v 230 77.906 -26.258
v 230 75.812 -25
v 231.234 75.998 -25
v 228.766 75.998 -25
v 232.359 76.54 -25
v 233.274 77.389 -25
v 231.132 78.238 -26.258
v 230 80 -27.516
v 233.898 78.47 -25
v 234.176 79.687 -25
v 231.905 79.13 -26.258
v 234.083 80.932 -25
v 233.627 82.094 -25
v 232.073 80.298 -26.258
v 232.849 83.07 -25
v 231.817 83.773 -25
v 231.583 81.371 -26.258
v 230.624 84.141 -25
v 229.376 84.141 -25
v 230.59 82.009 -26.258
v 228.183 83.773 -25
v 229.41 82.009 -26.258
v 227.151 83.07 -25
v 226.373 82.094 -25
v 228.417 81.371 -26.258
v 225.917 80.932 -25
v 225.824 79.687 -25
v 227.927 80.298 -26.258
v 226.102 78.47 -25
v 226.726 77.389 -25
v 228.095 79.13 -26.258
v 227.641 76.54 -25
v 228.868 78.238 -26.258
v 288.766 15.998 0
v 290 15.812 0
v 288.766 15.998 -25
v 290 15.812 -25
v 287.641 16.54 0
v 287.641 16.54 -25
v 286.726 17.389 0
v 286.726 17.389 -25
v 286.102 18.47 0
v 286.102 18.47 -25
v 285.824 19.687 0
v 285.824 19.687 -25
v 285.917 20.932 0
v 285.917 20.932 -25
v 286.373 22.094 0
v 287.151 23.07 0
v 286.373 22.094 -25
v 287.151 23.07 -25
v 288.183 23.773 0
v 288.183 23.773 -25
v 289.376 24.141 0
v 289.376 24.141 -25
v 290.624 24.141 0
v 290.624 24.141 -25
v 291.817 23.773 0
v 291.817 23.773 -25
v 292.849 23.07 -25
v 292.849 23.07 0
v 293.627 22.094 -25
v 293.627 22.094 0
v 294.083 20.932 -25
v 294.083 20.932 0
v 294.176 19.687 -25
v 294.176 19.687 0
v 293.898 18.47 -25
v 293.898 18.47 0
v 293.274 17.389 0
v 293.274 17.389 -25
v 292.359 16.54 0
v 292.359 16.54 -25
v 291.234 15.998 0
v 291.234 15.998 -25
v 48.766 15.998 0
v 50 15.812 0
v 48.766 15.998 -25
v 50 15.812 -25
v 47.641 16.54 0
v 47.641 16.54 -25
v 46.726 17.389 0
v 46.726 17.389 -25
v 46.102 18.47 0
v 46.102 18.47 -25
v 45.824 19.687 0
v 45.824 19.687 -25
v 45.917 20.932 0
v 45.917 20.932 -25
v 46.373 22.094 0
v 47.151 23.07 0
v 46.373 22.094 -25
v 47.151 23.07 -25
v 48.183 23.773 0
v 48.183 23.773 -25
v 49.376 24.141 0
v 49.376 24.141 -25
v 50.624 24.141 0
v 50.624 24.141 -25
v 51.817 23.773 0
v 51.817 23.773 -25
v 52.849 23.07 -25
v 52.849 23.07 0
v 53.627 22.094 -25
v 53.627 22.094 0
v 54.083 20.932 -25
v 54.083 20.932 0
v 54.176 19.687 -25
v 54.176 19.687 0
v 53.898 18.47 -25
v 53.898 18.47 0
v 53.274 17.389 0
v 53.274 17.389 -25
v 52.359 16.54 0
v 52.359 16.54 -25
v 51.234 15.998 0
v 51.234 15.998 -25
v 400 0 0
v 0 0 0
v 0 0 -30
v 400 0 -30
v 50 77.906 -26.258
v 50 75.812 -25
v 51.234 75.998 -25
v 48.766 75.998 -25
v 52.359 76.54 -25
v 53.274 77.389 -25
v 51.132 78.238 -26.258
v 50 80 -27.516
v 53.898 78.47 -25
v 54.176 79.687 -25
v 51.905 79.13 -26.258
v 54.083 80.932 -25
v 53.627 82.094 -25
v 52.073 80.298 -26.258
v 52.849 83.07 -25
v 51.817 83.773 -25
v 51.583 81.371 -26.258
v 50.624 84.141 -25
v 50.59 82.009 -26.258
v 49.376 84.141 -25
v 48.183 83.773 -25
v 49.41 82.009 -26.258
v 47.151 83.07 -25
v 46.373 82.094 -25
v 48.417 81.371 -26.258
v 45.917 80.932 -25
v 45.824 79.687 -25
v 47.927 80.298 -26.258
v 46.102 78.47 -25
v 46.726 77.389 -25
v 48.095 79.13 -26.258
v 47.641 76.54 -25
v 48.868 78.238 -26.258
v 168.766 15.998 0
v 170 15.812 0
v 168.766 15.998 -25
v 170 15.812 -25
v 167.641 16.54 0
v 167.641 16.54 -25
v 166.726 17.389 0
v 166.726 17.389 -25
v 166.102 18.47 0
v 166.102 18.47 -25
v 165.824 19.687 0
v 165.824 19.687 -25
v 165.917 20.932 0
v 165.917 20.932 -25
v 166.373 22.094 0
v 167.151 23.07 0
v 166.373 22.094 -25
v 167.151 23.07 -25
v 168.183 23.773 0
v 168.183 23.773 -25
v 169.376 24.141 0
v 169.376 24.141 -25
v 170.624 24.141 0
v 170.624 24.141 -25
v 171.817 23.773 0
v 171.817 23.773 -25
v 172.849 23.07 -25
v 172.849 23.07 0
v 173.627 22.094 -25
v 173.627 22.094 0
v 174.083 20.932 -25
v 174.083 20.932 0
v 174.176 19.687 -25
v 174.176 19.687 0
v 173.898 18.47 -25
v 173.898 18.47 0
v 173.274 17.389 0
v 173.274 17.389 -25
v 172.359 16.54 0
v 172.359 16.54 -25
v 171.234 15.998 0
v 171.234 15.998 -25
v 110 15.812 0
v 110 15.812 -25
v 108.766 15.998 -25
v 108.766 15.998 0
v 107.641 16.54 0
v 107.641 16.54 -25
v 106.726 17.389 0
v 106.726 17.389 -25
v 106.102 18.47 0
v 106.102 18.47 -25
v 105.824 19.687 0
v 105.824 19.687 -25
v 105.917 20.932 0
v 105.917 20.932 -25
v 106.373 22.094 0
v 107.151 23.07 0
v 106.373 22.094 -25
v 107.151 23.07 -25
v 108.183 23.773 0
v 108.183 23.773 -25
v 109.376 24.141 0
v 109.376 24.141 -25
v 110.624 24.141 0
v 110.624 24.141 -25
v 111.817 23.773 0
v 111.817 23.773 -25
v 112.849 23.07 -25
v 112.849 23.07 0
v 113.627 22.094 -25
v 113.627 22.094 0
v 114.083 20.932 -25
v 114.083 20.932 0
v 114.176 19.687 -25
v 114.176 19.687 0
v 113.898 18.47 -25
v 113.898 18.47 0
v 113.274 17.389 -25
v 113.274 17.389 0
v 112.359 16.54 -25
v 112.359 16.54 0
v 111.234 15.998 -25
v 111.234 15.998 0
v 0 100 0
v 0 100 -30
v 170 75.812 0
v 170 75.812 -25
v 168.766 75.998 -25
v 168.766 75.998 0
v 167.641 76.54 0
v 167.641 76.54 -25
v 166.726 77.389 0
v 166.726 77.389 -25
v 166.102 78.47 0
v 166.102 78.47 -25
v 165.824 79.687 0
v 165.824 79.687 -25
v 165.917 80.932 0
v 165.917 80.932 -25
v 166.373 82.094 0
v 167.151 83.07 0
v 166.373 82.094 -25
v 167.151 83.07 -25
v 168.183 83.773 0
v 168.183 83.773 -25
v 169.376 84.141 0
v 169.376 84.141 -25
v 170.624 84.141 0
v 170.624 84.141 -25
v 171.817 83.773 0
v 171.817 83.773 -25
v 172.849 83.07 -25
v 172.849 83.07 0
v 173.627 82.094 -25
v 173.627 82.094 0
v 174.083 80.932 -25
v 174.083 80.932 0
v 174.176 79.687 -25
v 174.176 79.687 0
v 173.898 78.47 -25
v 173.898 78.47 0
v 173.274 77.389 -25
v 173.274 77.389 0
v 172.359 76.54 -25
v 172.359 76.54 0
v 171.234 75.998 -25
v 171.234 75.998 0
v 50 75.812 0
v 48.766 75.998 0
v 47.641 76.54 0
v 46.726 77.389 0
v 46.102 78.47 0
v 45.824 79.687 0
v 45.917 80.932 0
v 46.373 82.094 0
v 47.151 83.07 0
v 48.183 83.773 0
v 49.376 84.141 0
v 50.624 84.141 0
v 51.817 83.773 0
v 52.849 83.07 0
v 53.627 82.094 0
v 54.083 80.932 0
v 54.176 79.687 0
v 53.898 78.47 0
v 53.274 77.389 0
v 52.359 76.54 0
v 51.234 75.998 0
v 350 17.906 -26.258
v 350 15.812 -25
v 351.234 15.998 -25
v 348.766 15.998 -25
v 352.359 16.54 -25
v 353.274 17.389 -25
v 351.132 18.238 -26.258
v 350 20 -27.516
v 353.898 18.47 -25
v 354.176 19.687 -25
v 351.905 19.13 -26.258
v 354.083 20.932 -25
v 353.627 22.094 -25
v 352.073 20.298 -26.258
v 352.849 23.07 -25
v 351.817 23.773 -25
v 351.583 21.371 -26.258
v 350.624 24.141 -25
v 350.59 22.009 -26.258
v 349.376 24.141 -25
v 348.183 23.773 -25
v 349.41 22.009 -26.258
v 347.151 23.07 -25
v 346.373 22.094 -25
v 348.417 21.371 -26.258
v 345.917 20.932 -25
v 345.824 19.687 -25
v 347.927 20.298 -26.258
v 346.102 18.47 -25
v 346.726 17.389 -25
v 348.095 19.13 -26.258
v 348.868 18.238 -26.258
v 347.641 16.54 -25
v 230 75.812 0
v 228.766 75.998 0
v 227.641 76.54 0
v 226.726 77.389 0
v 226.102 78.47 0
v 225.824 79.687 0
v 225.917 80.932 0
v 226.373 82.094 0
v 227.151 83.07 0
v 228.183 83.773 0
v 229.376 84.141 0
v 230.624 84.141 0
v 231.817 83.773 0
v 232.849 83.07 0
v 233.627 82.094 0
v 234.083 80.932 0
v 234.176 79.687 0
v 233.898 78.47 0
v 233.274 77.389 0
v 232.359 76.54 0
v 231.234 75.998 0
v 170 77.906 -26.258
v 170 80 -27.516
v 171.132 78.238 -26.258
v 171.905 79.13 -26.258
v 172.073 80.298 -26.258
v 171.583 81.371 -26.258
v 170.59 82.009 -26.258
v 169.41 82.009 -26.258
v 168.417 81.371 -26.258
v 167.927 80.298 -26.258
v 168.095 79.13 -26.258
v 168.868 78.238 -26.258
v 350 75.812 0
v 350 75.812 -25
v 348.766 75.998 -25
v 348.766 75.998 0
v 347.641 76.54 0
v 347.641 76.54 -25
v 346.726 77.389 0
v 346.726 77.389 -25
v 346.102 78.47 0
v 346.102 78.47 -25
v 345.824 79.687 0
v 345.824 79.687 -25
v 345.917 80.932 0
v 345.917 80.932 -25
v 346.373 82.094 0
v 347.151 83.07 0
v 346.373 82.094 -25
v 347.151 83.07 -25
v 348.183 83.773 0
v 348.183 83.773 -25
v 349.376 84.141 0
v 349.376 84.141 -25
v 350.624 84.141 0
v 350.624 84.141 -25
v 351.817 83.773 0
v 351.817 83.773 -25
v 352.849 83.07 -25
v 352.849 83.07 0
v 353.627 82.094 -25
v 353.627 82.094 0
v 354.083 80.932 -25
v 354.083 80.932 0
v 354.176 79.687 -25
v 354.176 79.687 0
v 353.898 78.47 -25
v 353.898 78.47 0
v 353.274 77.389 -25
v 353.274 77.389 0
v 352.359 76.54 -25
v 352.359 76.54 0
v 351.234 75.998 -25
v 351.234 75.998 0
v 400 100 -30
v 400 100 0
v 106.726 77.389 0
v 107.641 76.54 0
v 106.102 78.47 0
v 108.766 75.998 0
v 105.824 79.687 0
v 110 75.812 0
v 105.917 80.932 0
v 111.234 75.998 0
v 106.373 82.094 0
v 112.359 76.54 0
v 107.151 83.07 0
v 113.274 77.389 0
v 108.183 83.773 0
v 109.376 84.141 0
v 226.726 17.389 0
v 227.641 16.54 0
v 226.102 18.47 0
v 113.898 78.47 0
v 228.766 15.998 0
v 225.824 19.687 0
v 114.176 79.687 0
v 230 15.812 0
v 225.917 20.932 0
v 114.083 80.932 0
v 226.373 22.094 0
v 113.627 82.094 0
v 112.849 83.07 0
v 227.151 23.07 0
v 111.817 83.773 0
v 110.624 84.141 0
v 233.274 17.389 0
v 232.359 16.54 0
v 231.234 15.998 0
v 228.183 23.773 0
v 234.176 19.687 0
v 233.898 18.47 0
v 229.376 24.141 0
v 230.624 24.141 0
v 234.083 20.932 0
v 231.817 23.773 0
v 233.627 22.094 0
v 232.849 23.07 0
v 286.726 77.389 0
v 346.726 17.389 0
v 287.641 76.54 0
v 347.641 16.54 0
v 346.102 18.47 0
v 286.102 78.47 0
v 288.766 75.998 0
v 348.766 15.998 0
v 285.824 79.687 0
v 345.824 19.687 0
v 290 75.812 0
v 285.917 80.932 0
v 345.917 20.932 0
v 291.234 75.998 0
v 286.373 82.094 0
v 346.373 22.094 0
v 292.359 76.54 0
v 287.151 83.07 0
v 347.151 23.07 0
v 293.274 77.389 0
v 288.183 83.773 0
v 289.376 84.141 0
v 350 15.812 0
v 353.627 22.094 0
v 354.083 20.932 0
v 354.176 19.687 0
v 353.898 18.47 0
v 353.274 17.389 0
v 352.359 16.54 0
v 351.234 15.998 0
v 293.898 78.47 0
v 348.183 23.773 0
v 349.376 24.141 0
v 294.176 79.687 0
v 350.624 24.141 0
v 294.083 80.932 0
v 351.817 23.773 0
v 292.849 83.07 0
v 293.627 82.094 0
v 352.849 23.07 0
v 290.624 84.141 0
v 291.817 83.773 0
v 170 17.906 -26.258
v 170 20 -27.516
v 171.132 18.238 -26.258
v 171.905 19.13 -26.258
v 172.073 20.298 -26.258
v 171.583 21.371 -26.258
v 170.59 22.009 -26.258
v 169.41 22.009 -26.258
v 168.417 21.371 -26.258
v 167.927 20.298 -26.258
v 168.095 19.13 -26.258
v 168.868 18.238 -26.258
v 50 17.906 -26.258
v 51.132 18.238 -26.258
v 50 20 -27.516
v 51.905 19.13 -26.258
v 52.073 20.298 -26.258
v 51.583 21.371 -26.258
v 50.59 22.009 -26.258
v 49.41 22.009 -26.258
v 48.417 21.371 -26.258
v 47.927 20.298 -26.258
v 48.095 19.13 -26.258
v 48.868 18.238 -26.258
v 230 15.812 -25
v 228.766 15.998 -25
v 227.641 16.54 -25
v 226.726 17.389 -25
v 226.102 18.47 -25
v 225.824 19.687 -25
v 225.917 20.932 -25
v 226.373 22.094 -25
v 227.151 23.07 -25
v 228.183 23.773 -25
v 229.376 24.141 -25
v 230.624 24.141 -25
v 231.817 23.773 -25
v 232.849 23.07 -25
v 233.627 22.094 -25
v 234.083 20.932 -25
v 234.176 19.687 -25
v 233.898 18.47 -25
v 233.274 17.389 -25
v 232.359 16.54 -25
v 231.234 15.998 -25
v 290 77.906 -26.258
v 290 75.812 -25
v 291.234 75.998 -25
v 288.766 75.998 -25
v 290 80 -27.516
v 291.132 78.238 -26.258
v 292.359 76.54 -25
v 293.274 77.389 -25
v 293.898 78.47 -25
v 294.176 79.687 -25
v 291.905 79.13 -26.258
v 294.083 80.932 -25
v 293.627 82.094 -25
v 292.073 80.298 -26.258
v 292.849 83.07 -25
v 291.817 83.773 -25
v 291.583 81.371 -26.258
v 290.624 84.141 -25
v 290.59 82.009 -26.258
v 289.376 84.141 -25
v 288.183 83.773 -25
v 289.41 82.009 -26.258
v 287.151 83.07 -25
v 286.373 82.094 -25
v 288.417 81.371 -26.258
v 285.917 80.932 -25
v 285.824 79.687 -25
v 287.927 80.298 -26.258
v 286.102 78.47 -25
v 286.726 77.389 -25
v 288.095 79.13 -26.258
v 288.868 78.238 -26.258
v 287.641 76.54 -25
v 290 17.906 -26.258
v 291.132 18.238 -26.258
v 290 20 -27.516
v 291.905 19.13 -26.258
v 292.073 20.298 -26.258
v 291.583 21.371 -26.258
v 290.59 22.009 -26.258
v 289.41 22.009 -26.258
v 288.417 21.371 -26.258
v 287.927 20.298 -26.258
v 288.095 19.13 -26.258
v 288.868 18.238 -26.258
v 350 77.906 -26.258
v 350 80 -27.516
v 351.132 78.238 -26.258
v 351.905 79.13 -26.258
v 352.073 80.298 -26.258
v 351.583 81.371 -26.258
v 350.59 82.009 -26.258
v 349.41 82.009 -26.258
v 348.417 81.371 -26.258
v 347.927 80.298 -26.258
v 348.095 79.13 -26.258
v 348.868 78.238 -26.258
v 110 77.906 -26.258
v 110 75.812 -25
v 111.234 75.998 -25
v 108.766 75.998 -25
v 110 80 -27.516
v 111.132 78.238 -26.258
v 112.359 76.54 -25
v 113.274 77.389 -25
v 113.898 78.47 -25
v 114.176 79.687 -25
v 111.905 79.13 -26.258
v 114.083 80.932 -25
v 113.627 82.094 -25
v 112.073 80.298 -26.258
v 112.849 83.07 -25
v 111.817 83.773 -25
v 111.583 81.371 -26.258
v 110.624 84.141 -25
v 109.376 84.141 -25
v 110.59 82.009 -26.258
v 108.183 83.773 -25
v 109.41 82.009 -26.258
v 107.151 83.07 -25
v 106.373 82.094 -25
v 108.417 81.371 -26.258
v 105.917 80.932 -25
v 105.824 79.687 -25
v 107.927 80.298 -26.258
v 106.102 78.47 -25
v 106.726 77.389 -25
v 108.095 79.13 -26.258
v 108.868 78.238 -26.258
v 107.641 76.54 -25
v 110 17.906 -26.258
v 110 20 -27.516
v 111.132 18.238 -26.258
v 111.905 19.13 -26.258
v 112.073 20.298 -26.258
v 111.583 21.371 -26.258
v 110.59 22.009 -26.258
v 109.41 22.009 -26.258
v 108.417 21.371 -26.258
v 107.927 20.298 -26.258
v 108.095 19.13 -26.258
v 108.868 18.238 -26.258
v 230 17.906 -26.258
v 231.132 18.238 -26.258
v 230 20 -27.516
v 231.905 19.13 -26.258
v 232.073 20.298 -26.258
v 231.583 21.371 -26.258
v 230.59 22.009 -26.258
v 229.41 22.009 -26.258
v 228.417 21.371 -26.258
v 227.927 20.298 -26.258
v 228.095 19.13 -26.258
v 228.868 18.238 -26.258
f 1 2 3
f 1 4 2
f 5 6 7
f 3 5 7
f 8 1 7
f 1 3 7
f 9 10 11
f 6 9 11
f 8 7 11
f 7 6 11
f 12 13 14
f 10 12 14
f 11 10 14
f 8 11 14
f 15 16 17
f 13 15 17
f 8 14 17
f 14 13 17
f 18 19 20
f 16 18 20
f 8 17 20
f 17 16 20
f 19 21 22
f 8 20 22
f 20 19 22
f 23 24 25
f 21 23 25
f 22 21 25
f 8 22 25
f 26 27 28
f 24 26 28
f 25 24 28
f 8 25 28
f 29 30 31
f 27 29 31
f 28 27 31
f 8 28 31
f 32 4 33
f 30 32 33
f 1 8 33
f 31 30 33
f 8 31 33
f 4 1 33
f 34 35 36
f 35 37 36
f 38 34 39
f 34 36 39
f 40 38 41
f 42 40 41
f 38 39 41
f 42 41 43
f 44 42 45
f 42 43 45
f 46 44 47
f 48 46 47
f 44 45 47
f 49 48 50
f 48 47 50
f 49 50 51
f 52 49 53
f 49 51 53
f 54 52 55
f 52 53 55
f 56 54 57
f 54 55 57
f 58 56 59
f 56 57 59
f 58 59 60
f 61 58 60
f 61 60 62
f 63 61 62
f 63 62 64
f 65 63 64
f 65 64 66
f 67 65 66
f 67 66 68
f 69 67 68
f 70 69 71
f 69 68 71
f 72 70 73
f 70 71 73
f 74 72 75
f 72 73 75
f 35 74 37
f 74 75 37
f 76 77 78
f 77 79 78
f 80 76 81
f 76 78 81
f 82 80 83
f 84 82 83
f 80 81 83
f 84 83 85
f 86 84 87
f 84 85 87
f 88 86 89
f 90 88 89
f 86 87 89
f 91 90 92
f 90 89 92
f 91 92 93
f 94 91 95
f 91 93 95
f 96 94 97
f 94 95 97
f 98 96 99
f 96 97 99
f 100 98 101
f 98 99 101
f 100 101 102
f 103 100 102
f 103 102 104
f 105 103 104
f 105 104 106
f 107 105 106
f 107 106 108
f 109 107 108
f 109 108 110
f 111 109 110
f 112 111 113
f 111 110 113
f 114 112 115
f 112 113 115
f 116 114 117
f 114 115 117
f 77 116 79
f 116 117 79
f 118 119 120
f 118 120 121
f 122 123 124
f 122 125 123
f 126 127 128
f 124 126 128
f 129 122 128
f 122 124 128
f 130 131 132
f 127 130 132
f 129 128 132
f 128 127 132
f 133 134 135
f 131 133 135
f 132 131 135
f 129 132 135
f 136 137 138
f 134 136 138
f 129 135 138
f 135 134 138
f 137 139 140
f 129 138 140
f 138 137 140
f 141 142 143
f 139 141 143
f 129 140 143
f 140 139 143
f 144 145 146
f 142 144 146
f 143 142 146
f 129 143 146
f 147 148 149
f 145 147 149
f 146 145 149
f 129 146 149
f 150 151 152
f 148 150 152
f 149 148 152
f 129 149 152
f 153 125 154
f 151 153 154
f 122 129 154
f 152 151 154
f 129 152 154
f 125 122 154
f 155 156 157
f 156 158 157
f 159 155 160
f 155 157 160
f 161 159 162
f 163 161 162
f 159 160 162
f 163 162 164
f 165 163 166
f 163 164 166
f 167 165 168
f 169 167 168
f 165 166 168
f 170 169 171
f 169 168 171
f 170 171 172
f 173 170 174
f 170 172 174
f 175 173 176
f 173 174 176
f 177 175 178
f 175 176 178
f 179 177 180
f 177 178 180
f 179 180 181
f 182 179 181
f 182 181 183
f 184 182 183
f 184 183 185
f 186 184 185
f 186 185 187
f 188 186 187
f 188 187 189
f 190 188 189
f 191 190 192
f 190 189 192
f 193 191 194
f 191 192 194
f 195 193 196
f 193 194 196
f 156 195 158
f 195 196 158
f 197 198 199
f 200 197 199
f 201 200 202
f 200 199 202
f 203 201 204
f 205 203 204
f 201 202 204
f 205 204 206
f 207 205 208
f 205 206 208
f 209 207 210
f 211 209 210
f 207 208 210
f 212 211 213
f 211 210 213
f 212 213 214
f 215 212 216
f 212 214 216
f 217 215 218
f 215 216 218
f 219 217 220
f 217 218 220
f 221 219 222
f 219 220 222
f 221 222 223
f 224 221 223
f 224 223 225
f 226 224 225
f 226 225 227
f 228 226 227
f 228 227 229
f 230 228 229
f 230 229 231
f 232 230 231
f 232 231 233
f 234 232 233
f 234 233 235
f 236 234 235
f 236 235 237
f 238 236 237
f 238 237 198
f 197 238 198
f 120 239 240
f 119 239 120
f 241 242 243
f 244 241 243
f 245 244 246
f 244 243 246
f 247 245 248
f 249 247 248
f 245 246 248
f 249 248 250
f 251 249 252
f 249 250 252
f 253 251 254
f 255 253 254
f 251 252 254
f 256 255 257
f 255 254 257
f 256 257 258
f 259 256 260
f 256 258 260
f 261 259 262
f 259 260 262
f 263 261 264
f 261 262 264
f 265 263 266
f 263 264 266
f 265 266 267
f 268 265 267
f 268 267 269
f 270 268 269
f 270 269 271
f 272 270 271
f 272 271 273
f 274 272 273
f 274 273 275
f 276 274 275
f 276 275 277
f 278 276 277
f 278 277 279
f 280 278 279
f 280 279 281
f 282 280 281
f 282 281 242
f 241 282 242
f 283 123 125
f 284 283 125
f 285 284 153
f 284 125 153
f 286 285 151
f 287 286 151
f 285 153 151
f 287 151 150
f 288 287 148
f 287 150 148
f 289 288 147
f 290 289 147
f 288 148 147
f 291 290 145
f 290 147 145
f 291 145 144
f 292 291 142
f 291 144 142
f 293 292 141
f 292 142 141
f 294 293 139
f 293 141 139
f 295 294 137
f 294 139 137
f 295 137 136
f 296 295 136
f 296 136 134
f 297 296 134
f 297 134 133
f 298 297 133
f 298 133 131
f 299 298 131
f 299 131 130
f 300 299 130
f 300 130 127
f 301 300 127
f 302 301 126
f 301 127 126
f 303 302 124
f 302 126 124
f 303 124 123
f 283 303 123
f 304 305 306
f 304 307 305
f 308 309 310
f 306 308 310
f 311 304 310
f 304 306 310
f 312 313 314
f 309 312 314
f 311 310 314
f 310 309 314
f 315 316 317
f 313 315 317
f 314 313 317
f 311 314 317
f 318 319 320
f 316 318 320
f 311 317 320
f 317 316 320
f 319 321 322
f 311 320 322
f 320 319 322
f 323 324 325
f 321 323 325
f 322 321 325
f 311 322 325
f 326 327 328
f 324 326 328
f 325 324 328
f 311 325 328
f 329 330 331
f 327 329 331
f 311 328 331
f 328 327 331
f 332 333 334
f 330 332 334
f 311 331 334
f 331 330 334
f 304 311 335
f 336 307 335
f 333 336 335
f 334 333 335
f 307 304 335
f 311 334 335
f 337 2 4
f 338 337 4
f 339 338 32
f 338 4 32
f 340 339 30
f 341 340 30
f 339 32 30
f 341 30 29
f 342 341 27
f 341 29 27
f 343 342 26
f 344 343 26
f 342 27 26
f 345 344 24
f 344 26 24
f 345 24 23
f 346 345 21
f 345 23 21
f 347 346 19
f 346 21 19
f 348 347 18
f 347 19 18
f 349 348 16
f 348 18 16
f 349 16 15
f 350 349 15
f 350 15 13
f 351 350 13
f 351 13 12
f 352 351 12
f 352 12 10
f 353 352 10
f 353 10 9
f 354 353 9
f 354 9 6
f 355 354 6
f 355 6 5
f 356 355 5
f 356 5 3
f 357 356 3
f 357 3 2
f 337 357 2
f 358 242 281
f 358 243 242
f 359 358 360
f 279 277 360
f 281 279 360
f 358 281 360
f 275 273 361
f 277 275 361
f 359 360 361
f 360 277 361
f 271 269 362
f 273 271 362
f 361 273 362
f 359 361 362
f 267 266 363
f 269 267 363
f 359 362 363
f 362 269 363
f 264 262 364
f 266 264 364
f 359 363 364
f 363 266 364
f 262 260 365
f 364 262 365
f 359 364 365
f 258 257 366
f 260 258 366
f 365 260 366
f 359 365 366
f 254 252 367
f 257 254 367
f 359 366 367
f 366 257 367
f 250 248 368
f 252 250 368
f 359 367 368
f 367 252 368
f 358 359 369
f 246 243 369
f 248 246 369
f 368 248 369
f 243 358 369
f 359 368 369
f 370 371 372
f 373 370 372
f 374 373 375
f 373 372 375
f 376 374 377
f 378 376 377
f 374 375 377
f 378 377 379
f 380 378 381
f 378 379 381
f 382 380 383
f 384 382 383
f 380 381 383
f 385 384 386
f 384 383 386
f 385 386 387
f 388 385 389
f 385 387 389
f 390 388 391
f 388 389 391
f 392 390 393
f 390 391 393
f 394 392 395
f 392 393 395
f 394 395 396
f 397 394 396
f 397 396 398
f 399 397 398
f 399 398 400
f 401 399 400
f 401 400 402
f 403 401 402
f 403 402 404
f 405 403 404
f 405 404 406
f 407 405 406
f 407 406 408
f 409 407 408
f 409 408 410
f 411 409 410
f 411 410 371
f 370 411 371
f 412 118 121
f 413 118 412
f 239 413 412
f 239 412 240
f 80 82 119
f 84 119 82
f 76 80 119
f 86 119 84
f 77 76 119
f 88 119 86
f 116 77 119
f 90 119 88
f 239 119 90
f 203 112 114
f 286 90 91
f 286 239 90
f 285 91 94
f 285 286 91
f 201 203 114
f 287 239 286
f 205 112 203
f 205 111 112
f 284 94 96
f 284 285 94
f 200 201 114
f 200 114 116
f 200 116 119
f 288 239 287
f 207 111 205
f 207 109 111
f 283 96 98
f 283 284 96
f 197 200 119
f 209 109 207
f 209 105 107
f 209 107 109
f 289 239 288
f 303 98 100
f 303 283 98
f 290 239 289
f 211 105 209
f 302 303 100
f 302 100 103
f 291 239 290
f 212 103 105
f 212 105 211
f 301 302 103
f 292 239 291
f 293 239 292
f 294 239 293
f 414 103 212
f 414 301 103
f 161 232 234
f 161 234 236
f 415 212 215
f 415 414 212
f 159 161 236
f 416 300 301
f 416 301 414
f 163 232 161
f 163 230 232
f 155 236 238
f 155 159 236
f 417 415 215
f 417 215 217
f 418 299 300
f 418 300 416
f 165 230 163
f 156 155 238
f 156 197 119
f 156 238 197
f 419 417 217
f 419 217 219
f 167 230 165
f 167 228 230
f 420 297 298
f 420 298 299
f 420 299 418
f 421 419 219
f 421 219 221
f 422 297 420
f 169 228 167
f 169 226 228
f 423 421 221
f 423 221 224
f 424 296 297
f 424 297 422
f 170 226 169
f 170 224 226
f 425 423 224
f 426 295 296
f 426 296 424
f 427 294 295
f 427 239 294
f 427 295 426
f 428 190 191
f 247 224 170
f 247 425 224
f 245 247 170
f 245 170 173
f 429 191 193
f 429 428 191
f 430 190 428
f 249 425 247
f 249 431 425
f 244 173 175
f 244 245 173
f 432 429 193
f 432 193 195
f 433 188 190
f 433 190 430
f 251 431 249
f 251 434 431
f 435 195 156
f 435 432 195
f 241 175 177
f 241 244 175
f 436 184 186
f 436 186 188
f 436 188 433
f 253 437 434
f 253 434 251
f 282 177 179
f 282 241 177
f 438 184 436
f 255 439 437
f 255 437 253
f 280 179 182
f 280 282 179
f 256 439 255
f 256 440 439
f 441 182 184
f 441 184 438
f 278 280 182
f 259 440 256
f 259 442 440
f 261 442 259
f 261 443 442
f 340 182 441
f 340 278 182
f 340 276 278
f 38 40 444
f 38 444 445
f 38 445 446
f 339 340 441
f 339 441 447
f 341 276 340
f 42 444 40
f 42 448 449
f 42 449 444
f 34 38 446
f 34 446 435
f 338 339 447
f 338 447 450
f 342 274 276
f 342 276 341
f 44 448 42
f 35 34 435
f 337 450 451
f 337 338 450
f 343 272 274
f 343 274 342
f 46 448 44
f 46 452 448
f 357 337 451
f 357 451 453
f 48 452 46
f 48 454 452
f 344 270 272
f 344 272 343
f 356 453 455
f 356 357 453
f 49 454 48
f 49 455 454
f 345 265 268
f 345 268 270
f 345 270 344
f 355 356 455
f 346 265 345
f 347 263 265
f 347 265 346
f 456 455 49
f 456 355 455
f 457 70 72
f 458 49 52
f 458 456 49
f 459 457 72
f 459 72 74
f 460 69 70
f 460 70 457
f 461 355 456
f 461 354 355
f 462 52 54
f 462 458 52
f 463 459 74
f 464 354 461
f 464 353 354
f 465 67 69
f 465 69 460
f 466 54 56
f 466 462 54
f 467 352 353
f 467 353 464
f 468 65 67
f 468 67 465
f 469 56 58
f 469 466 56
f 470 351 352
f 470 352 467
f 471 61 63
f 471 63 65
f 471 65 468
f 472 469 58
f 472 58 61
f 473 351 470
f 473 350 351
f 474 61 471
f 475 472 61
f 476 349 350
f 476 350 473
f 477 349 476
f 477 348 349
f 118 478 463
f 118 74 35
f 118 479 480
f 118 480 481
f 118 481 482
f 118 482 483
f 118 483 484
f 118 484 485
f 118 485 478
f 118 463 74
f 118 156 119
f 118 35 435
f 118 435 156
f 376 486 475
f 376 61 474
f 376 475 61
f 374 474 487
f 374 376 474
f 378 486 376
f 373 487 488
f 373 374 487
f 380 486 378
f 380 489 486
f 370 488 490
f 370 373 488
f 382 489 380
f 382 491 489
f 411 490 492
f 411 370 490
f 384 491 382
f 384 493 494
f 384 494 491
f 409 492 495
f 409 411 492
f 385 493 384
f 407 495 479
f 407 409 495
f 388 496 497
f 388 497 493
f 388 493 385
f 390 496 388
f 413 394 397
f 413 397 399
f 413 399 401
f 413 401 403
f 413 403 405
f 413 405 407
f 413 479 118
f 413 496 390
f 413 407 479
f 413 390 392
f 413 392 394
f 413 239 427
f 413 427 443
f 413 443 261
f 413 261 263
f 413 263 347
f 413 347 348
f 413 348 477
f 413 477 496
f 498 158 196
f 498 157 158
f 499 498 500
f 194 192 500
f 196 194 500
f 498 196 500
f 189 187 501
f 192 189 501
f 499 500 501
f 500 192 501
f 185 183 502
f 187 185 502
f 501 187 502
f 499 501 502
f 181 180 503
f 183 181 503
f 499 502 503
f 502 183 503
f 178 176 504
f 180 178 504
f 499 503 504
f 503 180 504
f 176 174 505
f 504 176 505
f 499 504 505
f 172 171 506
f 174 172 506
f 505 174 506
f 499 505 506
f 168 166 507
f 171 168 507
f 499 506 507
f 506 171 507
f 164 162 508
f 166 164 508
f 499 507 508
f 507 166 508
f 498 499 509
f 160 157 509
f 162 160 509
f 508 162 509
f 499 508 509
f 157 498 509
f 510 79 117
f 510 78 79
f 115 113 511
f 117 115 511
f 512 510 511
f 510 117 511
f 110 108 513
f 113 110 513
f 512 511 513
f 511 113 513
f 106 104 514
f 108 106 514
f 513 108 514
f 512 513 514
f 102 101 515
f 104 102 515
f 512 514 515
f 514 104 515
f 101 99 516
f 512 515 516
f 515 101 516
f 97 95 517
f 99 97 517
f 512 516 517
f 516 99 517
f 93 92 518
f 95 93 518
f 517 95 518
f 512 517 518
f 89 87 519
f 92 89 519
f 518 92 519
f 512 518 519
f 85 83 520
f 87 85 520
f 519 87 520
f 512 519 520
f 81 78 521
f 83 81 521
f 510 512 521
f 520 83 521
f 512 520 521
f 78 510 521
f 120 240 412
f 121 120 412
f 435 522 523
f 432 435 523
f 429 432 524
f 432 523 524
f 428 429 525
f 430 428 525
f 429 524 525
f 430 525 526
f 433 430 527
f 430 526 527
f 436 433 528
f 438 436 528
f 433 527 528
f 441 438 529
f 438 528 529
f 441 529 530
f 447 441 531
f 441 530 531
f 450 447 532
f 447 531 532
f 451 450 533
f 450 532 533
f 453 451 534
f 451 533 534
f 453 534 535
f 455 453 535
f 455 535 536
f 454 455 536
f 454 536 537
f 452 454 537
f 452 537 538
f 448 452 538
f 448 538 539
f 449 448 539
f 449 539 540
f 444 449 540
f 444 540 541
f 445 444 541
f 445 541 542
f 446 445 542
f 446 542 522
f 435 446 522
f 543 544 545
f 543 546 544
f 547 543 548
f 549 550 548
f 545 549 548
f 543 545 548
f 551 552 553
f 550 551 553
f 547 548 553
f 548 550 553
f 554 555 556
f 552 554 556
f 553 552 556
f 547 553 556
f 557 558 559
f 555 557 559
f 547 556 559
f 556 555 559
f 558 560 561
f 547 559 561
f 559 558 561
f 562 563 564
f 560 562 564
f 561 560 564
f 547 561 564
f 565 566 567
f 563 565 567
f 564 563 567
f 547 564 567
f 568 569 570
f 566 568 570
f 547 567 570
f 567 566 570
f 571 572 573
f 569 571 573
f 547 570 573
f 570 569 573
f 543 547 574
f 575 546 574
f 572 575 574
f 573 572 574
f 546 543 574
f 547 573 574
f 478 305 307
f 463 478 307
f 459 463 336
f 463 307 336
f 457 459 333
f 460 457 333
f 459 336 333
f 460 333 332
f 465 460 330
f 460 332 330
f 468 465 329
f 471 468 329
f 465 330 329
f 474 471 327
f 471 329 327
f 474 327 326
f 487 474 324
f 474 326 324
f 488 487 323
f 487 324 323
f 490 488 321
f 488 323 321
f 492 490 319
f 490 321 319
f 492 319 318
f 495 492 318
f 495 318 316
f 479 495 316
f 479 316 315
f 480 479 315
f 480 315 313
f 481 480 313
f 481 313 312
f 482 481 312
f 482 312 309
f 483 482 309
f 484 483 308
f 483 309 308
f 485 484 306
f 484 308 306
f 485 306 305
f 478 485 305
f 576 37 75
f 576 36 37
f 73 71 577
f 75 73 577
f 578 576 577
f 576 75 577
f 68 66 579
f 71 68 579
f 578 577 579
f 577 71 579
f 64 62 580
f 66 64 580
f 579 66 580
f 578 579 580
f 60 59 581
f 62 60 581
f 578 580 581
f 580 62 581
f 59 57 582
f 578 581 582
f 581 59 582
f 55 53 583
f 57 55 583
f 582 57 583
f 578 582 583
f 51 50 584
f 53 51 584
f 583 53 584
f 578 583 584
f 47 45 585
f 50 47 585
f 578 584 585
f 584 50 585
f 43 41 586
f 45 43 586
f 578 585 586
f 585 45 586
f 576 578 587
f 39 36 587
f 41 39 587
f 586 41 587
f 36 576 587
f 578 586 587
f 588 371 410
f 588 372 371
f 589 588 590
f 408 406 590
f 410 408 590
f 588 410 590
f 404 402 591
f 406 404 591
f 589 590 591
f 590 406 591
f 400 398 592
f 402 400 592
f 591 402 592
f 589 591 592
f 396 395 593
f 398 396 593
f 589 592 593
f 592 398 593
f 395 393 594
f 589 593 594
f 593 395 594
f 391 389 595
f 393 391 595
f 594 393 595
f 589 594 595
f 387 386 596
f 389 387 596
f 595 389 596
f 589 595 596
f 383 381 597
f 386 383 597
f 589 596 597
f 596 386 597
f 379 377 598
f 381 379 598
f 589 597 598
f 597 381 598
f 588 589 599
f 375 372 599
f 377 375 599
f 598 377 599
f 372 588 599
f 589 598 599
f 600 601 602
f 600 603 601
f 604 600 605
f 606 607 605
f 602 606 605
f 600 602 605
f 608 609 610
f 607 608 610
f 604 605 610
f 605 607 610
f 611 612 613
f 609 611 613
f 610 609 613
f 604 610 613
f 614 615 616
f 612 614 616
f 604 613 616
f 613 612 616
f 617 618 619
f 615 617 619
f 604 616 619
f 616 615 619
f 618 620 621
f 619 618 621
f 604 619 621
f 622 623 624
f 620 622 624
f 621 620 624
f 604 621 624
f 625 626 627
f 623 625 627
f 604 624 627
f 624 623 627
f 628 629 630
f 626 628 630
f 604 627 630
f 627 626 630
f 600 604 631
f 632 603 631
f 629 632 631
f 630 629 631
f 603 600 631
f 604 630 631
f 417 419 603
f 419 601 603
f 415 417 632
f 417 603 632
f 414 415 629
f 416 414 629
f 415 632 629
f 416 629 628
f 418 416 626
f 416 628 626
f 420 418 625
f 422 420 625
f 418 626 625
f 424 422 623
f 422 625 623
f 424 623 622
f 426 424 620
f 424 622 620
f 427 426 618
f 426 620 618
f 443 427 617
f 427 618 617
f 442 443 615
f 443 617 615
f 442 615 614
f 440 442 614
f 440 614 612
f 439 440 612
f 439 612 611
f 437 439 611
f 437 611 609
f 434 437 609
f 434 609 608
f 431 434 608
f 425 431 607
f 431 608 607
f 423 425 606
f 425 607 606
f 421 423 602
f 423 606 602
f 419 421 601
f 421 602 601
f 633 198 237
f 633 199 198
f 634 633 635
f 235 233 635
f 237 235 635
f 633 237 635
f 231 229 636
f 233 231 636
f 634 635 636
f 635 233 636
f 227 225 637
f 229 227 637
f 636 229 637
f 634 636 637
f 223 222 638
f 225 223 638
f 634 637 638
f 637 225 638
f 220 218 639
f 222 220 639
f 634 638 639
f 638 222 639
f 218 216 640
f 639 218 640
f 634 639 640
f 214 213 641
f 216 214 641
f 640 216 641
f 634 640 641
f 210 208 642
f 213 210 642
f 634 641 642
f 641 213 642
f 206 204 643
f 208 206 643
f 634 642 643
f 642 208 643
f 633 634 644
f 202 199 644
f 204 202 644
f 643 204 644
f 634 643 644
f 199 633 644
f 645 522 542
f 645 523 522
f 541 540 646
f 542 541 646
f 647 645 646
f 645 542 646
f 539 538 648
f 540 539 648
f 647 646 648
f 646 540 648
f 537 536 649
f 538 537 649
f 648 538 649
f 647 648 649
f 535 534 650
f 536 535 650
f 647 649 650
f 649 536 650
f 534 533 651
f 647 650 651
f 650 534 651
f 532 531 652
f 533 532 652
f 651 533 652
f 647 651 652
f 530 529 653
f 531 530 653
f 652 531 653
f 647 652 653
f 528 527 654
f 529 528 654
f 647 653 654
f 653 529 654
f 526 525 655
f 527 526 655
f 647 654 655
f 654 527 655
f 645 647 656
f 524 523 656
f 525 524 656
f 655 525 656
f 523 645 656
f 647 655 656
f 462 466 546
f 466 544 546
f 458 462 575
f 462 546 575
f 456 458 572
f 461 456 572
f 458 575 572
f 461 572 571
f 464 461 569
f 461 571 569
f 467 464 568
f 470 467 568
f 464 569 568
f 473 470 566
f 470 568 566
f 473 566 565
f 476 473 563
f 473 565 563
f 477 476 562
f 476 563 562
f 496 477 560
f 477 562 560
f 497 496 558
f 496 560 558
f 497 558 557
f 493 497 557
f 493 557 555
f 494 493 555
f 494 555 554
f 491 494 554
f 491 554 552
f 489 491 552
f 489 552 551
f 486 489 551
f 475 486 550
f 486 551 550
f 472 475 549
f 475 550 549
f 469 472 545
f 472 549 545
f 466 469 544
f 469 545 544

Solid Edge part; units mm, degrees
sketch "Sketch1" plane through (0, 0, 0) normal (0, 0, 1) x (1, 0, 0)
  line L0 (0, 0) -> (400, 0)
  line L1 (400, 0) -> (400, 100)
  line L2 (400, 100) -> (0, 100)
  line L3 (0, 100) -> (0, 0)
  dimension "D1" = 400
  dimension "D2" = 100
extrude "Protrusion1" add sketch "Sketch1" against normal blind 30
hole "Hole_1" at (50, 80, 0) direction (0, 0, -1) diameter 8.376 depth 25 tip angle 118 thread major 10 thread length 20
hole "Hole1" at (50, 20, 0) direction (0, 0, -1) diameter 8.376 depth 25 tip angle 118 thread major 10 thread length 20
hole "Hole2" at (110, 80, 0) direction (0, 0, -1) diameter 8.376 depth 25 tip angle 118 thread major 10 thread length 20
hole "Hole3" at (110, 20, 0) direction (0, 0, -1) diameter 8.376 depth 25 tip angle 118 thread major 10 thread length 20
hole "Hole4" at (170, 80, 0) direction (0, 0, -1) diameter 8.376 depth 25 tip angle 118 thread major 10 thread length 20
hole "Hole5" at (230, 80, 0) direction (0, 0, -1) diameter 8.376 depth 25 tip angle 118 thread major 10 thread length 20
hole "Hole6" at (170, 20, 0) direction (0, 0, -1) diameter 8.376 depth 25 tip angle 118 thread major 10 thread length 20
hole "Hole7" at (230, 20, 0) direction (0, 0, -1) diameter 8.376 depth 25 tip angle 118 thread major 10 thread length 20
hole "Hole8" at (290, 80, 0) direction (0, 0, -1) diameter 8.376 depth 25 tip angle 118 thread major 10 thread length 20
hole "Hole9" at (350, 80, 0) direction (0, 0, -1) diameter 8.376 depth 25 tip angle 118 thread major 10 thread length 20
hole "Hole10" at (290, 20, 0) direction (0, 0, -1) diameter 8.376 depth 25 tip angle 118 thread major 10 thread length 20
hole "Hole11" at (350, 20, 0) direction (0, 0, -1) diameter 8.376 depth 25 tip angle 118 thread major 10 thread length 20
